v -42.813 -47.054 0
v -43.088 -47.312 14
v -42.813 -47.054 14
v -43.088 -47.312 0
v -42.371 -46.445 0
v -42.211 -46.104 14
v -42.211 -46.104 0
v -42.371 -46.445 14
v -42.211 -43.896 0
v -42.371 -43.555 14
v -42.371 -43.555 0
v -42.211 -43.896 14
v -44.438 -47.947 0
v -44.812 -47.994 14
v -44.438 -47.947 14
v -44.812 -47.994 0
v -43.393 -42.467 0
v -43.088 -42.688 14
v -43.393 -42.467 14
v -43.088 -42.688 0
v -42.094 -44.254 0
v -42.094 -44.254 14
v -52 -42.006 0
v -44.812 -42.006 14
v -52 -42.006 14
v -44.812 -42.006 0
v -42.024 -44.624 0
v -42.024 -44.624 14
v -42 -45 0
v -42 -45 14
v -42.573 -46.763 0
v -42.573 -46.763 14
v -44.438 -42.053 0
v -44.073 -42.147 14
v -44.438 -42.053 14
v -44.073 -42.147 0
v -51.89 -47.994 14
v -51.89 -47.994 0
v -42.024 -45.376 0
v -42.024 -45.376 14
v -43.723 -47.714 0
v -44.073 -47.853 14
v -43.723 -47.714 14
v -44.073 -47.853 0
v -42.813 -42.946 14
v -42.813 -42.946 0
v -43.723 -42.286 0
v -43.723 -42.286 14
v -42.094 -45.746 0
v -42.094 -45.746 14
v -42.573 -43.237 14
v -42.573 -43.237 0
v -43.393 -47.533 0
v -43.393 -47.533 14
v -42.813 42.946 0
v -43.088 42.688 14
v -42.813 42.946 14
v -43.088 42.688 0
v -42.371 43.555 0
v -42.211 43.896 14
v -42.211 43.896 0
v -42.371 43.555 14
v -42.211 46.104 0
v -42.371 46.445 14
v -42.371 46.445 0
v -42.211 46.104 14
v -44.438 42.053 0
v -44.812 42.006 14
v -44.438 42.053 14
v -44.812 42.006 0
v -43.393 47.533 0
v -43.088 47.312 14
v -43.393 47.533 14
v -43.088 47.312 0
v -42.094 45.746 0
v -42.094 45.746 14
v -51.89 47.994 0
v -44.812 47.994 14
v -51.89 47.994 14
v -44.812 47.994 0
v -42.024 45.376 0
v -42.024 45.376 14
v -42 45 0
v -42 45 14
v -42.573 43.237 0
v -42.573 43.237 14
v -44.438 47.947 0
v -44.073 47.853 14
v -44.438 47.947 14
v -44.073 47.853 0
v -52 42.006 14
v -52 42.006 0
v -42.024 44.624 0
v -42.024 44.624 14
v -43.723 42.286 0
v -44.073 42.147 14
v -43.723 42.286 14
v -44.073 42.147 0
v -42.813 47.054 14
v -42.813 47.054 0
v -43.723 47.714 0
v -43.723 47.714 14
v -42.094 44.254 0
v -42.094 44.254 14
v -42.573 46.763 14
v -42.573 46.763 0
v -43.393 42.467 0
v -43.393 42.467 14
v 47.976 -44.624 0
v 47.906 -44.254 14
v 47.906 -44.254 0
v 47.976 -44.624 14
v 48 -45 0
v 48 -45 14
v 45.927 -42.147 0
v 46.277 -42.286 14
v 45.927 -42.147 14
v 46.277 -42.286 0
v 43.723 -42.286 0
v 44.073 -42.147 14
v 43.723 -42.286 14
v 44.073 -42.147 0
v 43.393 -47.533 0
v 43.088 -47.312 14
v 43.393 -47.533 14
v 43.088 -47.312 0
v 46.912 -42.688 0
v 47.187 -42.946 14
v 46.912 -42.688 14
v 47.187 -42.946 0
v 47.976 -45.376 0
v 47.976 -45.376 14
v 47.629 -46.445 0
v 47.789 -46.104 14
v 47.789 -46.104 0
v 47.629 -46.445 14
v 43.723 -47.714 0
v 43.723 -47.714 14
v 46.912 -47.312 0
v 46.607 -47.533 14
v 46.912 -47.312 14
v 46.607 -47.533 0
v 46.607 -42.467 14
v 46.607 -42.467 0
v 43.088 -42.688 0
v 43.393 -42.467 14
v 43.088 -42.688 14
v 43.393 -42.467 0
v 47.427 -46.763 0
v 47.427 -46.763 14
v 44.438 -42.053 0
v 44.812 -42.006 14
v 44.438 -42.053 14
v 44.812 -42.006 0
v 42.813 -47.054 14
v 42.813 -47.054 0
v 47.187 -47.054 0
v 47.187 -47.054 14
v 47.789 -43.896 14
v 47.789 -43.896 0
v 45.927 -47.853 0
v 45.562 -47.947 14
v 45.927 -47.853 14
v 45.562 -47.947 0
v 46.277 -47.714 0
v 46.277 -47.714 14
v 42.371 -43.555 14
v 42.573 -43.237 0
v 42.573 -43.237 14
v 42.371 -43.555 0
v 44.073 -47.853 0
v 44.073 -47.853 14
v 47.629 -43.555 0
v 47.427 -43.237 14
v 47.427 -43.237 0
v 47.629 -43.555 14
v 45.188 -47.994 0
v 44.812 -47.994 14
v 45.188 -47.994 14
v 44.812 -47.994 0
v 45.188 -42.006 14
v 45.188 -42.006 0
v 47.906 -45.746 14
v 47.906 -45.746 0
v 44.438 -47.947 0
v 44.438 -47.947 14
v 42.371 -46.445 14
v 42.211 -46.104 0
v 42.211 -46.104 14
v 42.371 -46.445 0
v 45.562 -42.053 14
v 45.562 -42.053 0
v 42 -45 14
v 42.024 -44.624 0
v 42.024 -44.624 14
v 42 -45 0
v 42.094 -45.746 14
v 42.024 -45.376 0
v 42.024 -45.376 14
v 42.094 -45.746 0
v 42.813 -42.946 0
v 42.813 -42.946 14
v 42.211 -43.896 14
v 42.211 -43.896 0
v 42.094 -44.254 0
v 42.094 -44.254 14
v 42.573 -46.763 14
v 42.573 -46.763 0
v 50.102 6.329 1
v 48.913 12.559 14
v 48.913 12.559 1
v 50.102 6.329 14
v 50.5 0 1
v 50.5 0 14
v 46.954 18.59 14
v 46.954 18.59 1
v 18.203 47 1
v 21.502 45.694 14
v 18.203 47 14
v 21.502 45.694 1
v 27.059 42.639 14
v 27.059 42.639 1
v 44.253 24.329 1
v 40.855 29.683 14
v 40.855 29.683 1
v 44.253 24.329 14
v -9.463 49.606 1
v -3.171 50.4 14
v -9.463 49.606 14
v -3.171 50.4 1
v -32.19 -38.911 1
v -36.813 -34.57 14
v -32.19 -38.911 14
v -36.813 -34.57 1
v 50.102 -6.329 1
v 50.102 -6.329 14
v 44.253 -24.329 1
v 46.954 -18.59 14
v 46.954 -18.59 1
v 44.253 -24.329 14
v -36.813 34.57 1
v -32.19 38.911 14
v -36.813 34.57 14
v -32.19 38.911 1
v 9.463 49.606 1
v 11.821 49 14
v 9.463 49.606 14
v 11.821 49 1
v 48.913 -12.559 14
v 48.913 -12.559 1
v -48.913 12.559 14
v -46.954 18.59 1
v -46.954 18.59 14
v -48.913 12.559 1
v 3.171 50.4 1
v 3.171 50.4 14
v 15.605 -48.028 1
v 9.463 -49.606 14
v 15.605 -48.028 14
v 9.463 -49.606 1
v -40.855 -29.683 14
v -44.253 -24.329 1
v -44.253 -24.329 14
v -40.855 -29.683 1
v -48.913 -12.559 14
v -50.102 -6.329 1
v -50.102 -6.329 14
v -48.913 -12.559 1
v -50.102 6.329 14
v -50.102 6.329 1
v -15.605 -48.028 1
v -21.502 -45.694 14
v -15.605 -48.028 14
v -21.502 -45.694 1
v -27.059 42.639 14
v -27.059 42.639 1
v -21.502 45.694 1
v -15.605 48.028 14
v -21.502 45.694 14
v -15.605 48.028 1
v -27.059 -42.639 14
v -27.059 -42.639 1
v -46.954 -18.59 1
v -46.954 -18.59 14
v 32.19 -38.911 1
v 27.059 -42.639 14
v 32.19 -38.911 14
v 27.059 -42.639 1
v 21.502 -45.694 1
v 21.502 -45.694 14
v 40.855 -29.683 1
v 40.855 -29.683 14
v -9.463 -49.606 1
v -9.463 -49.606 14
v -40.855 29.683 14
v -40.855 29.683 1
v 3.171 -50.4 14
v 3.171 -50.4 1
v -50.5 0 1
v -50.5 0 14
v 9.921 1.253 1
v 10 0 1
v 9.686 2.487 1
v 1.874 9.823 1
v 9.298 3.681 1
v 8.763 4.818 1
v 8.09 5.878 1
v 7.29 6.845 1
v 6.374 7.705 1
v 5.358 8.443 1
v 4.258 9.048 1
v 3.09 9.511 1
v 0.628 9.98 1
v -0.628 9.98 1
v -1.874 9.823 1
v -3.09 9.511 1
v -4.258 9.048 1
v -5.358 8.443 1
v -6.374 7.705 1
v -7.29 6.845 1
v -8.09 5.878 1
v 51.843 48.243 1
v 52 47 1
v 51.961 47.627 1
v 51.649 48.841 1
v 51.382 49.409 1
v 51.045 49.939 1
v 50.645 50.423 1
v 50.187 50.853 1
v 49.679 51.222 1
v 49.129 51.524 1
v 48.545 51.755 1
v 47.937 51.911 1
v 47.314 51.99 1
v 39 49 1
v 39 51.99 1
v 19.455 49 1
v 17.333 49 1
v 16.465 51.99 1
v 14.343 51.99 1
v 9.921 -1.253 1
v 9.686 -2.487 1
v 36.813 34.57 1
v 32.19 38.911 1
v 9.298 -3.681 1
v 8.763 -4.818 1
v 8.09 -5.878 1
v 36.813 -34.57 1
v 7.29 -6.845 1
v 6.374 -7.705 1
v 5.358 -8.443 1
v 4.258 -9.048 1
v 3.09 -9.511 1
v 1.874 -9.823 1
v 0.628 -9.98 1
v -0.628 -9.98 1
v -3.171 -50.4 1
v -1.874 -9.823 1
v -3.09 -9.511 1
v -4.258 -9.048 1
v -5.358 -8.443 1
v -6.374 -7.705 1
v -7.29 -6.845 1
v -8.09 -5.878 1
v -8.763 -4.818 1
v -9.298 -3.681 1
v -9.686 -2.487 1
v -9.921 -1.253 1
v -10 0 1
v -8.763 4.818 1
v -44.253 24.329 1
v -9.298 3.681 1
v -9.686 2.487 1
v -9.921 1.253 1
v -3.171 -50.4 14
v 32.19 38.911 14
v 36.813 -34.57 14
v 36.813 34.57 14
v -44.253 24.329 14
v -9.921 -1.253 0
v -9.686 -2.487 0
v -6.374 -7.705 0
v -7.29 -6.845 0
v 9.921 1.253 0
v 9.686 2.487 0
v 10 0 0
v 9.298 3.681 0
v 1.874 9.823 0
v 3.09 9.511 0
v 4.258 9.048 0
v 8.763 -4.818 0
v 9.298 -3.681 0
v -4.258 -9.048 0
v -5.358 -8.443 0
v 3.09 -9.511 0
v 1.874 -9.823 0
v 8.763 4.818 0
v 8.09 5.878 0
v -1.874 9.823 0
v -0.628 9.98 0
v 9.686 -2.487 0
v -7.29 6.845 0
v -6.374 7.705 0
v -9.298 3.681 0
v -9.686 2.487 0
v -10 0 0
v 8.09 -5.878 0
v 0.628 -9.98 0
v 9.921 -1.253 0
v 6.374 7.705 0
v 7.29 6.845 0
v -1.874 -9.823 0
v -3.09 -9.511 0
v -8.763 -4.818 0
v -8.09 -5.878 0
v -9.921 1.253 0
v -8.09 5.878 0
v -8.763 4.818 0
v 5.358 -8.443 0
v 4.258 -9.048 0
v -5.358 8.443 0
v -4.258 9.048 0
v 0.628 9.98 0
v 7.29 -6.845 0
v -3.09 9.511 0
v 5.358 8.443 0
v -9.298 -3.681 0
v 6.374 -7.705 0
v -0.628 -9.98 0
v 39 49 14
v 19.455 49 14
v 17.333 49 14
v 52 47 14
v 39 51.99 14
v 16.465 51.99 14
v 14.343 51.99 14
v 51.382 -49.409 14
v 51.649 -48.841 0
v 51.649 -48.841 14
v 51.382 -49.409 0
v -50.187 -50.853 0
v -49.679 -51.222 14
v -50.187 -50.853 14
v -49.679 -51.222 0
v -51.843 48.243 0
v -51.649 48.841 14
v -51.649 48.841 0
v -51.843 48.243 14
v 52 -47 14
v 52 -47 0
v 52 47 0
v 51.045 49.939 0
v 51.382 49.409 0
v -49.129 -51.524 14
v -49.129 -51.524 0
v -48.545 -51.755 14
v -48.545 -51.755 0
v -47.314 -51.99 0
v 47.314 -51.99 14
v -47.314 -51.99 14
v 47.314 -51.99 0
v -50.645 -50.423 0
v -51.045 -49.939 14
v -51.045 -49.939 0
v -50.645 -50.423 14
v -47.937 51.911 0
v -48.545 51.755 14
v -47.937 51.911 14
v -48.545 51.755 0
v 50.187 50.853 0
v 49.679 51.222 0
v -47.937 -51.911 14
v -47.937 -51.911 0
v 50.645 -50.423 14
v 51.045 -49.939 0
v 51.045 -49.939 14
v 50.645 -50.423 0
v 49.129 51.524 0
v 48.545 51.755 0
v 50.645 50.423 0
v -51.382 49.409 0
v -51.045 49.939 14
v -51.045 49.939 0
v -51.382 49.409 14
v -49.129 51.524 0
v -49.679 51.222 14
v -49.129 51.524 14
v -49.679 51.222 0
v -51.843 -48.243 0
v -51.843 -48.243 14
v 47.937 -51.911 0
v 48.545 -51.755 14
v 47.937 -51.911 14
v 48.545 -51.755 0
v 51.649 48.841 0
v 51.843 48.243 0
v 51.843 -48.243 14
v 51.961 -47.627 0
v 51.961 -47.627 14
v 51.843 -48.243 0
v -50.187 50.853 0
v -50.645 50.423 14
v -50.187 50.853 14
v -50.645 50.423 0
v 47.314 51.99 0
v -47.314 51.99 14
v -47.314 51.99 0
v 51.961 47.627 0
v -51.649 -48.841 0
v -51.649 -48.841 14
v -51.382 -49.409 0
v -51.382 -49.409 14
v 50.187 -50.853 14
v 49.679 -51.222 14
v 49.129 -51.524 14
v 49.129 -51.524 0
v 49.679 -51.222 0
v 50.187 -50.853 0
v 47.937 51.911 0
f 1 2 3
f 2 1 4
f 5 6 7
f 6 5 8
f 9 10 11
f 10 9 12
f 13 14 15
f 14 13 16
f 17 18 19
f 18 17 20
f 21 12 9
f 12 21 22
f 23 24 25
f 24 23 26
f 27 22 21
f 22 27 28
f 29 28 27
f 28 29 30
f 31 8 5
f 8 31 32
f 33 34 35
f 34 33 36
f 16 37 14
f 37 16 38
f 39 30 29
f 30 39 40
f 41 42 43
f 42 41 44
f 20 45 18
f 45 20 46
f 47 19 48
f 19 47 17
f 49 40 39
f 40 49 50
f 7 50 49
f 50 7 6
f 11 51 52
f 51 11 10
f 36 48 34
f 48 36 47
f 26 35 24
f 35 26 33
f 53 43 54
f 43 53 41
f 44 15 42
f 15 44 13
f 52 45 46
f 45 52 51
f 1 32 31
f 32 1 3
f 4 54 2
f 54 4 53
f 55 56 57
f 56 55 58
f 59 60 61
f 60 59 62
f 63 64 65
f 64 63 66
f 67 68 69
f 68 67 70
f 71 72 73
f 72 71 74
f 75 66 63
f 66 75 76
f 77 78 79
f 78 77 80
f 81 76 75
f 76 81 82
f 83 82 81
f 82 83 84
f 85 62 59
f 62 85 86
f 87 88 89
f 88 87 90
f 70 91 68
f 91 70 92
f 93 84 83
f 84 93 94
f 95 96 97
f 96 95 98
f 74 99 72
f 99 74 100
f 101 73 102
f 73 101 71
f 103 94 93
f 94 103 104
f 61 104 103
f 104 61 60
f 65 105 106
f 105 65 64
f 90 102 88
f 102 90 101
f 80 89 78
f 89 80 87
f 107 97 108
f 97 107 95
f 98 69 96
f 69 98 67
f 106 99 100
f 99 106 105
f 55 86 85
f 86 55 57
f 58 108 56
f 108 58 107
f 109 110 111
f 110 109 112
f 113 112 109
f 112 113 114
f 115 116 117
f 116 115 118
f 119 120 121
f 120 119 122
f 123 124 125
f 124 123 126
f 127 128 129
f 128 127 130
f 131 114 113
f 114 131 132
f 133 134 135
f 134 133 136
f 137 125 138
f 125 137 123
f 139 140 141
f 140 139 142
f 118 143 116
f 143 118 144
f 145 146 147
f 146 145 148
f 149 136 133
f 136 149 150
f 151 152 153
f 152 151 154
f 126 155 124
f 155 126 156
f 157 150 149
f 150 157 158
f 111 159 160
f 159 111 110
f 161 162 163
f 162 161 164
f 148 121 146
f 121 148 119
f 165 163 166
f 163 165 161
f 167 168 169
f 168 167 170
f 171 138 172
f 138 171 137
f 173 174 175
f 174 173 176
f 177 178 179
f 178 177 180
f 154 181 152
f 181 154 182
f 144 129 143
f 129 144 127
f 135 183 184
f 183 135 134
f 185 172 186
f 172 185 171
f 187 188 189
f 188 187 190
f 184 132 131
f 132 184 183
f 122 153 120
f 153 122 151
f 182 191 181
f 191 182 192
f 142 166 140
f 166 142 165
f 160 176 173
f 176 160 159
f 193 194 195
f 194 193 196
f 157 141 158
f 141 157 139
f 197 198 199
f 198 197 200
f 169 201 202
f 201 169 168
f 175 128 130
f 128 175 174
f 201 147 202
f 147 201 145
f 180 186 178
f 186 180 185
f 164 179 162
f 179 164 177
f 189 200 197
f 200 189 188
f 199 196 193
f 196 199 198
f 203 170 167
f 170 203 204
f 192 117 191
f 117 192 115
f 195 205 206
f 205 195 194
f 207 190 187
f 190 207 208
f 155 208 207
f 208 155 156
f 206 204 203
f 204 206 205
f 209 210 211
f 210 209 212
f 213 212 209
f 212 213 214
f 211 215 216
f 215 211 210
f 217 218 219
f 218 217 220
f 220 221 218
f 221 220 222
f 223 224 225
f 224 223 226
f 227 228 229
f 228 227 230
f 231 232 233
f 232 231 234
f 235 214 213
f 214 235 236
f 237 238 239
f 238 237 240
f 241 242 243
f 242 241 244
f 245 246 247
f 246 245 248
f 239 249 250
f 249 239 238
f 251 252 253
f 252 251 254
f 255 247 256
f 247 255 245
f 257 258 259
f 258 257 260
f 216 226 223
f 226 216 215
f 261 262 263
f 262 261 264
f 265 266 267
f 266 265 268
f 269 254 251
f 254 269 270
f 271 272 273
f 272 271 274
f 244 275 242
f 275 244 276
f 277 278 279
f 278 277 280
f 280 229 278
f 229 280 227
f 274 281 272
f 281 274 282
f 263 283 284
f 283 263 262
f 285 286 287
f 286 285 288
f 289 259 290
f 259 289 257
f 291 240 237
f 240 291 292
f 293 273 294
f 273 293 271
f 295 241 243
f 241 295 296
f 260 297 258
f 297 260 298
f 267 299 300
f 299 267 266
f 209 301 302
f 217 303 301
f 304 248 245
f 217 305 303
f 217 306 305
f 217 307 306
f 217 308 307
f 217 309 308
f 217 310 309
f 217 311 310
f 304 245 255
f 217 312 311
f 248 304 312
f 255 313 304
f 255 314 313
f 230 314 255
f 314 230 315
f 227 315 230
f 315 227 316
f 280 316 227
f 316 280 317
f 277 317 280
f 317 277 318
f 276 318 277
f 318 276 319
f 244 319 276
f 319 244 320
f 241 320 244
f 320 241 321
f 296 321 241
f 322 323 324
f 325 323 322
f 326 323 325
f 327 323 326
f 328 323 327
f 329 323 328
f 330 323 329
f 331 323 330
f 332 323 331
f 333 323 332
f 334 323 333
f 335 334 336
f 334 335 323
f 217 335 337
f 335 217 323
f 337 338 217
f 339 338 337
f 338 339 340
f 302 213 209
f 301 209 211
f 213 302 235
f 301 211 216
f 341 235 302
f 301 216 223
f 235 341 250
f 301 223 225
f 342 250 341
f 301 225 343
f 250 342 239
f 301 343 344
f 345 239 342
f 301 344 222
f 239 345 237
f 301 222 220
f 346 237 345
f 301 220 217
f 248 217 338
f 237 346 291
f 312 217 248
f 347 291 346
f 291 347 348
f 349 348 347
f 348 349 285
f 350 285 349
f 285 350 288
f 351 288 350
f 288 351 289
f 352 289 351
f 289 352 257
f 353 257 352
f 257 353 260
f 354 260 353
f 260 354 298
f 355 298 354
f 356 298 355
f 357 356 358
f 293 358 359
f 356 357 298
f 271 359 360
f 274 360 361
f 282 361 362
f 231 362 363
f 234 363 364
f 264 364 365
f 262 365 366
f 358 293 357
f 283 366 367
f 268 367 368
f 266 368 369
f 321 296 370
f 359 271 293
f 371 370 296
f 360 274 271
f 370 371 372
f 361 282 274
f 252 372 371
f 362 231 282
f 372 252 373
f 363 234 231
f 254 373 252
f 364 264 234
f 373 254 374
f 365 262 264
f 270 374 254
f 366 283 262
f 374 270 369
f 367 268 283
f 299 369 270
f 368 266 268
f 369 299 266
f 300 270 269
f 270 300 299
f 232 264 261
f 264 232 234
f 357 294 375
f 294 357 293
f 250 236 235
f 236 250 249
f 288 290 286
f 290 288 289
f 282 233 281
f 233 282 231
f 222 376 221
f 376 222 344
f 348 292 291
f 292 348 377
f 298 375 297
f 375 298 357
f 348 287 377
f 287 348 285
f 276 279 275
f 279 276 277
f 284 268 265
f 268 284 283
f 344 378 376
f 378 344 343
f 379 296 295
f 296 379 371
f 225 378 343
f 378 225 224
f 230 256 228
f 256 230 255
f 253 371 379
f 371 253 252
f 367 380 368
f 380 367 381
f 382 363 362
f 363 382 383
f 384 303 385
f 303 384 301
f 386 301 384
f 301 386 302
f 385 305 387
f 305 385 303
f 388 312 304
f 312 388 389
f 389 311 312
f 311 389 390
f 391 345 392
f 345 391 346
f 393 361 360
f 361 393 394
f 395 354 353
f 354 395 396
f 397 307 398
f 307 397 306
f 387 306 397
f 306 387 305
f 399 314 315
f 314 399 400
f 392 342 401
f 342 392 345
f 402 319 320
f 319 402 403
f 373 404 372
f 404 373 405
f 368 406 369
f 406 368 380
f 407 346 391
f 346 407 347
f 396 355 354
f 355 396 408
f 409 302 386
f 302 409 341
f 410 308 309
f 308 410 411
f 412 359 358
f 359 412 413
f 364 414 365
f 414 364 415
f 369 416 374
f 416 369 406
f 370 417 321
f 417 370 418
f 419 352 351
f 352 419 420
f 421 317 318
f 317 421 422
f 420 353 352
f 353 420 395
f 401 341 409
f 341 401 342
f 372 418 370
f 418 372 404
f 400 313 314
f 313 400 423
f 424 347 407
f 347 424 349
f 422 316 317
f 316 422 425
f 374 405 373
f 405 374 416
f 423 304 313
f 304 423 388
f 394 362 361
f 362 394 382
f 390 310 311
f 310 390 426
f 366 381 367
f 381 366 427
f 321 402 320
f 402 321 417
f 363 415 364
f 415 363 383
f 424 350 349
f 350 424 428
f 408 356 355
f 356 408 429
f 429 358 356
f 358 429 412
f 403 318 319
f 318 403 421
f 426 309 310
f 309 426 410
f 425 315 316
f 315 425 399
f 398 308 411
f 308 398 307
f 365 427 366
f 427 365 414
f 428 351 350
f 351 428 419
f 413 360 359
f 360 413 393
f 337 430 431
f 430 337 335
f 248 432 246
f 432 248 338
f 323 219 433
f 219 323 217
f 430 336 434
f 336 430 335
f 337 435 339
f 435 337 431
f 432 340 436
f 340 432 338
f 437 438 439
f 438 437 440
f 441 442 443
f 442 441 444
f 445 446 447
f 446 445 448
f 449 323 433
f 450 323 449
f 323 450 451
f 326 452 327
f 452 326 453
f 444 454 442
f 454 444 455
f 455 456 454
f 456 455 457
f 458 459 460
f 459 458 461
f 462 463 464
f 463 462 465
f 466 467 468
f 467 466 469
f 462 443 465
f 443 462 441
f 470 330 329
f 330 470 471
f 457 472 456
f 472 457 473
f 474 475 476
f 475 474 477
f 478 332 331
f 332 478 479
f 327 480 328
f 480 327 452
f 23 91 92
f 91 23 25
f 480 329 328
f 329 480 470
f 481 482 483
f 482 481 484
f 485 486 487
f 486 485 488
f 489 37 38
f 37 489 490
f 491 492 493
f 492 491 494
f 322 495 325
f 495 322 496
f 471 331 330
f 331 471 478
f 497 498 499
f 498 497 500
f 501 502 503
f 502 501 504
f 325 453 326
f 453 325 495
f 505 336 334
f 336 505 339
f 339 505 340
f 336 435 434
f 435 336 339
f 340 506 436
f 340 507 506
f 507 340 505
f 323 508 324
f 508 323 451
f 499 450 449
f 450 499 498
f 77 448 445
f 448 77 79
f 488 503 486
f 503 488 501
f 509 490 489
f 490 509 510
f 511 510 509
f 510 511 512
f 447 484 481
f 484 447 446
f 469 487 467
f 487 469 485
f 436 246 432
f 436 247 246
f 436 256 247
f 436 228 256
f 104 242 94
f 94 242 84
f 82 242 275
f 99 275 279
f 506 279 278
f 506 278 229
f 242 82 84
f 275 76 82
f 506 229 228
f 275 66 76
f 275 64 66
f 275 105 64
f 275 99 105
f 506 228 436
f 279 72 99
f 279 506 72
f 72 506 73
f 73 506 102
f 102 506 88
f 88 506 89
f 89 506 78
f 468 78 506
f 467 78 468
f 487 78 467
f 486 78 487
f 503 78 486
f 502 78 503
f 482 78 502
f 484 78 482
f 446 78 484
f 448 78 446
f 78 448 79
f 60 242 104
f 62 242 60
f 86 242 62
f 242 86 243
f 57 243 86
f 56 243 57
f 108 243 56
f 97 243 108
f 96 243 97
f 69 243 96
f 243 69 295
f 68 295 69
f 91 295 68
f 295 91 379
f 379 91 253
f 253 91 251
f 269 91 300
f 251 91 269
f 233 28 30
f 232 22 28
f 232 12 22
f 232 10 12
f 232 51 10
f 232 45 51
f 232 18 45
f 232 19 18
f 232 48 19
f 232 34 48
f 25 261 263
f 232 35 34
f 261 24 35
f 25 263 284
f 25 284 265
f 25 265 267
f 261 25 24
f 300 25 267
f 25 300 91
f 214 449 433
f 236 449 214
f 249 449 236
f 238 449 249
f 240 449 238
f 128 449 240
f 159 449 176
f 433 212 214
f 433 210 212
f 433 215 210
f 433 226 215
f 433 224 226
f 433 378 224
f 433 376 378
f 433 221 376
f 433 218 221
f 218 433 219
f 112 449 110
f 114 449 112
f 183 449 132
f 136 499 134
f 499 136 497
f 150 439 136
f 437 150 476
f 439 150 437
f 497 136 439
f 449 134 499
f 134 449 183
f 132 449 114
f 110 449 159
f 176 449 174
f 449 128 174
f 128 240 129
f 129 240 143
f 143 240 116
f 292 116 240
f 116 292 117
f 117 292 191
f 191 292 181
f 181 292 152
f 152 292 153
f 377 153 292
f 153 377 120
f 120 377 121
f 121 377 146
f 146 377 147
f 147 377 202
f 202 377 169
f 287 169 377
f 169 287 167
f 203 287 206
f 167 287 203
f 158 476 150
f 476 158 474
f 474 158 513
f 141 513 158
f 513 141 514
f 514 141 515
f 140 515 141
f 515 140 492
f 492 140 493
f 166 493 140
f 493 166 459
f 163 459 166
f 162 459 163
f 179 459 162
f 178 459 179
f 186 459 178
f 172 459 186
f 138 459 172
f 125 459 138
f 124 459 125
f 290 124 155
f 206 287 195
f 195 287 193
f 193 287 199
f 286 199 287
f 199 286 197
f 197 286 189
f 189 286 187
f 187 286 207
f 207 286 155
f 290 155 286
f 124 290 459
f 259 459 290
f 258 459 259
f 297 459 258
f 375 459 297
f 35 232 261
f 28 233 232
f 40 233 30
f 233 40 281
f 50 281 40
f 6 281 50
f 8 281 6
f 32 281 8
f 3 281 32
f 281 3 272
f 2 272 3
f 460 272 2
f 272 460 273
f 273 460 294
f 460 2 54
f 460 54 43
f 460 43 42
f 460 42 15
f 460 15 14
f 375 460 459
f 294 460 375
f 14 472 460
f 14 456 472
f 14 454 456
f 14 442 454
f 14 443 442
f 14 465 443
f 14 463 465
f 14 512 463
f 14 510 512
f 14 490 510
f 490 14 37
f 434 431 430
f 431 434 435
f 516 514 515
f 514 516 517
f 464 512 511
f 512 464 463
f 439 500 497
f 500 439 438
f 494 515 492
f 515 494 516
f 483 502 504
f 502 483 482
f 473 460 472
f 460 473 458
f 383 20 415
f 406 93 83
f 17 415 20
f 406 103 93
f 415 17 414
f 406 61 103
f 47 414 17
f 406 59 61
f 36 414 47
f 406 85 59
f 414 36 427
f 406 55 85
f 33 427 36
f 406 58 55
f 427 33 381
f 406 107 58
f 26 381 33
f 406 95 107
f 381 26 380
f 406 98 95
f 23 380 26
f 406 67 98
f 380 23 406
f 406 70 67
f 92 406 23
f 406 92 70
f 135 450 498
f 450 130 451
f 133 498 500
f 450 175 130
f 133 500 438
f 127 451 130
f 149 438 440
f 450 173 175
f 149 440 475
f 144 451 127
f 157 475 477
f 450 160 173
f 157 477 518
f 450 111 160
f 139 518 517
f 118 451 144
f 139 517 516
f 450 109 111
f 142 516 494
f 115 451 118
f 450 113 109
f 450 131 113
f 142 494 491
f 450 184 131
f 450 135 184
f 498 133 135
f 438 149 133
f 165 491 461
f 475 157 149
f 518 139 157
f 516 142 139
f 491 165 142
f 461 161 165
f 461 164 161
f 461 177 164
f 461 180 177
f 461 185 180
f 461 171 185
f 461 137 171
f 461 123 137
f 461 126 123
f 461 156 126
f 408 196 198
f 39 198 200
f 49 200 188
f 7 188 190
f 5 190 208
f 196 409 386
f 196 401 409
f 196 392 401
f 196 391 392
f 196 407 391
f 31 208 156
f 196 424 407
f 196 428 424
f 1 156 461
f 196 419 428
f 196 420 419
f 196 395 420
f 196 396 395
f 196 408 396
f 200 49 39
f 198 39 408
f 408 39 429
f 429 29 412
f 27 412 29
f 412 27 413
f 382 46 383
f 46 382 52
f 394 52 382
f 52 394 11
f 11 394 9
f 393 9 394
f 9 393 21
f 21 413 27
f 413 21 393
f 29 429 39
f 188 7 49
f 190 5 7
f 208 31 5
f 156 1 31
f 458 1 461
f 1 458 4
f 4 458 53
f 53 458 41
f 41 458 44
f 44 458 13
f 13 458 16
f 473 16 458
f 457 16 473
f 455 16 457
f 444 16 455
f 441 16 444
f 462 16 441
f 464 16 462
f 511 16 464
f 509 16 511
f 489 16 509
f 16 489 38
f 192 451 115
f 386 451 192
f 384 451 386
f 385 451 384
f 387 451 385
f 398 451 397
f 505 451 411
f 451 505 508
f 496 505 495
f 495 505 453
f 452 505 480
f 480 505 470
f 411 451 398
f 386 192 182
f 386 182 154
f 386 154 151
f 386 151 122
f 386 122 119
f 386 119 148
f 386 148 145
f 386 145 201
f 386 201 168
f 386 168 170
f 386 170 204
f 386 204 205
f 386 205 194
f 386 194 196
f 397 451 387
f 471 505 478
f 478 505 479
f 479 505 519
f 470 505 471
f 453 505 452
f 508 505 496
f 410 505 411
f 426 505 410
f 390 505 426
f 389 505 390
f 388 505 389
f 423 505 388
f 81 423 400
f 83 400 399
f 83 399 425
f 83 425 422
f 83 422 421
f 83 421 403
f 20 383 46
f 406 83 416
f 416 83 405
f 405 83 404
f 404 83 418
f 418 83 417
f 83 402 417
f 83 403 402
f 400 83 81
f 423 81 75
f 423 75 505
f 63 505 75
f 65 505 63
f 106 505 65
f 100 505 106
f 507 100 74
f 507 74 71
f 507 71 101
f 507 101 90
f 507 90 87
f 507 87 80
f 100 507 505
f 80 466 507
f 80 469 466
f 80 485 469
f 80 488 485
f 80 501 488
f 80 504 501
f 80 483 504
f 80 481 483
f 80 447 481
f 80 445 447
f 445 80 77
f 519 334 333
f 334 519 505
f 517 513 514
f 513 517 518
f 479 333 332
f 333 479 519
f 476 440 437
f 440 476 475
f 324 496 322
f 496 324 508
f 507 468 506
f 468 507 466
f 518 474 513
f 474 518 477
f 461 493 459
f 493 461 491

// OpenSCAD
$fn = 50;


difference() {
	union() {
		translate(v = [0, 0, 0]) {
			rotate(a = [0, 0, 0]) {
				hull() {
					translate(v = [-47.0000000000, 47.0000000000, 0]) {
						rotate(a = [0, 0, 0]) {
							translate(v = [0, 0, 0]) {
								rotate(a = [0, 0, 0]) {
									cylinder(h = 14, r = 5);
								}
							}
						}
					}
					translate(v = [47.0000000000, 47.0000000000, 0]) {
						rotate(a = [0, 0, 0]) {
							translate(v = [0, 0, 0]) {
								rotate(a = [0, 0, 0]) {
									cylinder(h = 14, r = 5);
								}
							}
						}
					}
					translate(v = [-47.0000000000, -47.0000000000, 0]) {
						rotate(a = [0, 0, 0]) {
							translate(v = [0, 0, 0]) {
								rotate(a = [0, 0, 0]) {
									cylinder(h = 14, r = 5);
								}
							}
						}
					}
					translate(v = [47.0000000000, -47.0000000000, 0]) {
						rotate(a = [0, 0, 0]) {
							translate(v = [0, 0, 0]) {
								rotate(a = [0, 0, 0]) {
									cylinder(h = 14, r = 5);
								}
							}
						}
					}
				}
			}
		}
	}
	union() {
		translate(v = [-52.5000000000, -45.0000000000, -125]) {
			rotate(a = [0, 0, 0]) {
				hull() {
					translate(v = [7.5000000000, 0, 0]) {
						rotate(a = [0, 0, 0]) {
							translate(v = [0, 0, 0]) {
								rotate(a = [0, 0, 0]) {
									cylinder(h = 250, r = 3.0000000000);
								}
							}
						}
					}
					translate(v = [-7.5000000000, 0, 0]) {
						rotate(a = [0, 0, 0]) {
							translate(v = [0, 0, 0]) {
								rotate(a = [0, 0, 0]) {
									cylinder(h = 250, r = 3.0000000000);
								}
							}
						}
					}
				}
			}
		}
		translate(v = [-52.5000000000, 45.0000000000, -125]) {
			rotate(a = [0, 0, 0]) {
				hull() {
					translate(v = [7.5000000000, 0, 0]) {
						rotate(a = [0, 0, 0]) {
							translate(v = [0, 0, 0]) {
								rotate(a = [0, 0, 0]) {
									cylinder(h = 250, r = 3.0000000000);
								}
							}
						}
					}
					translate(v = [-7.5000000000, 0, 0]) {
						rotate(a = [0, 0, 0]) {
							translate(v = [0, 0, 0]) {
								rotate(a = [0, 0, 0]) {
									cylinder(h = 250, r = 3.0000000000);
								}
							}
						}
					}
				}
			}
		}
		translate(v = [45.0000000000, -45.0000000000, -125.0000000000]) {
			rotate(a = [0, 0, 0]) {
				cylinder(h = 250, r = 3.0000000000);
			}
		}
		translate(v = [0, 0, 1.0000000000]) {
			rotate(a = [0, 0, 0]) {
				cylinder(h = 16, r = 50.5000000000);
			}
		}
		translate(v = [0, 0, -7.0000000000]) {
			rotate(a = [0, 0, 0]) {
				cylinder(h = 14, r = 10.0000000000);
			}
		}
		translate(v = [0.0000000000, 47.0000000000, 1]) {
			rotate(a = [0, 0, 0]) {
				cube(size = [52.0000000000, 2, 16]);
			}
		}
		translate(v = [39.0000000000, 47.0000000000, 1]) {
			rotate(a = [0, 0, 0]) {
				cube(size = [13.0000000000, 5, 16]);
			}
		}
		translate(v = [13.5833333333, 52.7500000000, 1]) {
			rotate(a = [0, 0, -45]) {
				cube(size = [7.5000000000, 1.5000000000, 16]);
			}
		}
	}
}
